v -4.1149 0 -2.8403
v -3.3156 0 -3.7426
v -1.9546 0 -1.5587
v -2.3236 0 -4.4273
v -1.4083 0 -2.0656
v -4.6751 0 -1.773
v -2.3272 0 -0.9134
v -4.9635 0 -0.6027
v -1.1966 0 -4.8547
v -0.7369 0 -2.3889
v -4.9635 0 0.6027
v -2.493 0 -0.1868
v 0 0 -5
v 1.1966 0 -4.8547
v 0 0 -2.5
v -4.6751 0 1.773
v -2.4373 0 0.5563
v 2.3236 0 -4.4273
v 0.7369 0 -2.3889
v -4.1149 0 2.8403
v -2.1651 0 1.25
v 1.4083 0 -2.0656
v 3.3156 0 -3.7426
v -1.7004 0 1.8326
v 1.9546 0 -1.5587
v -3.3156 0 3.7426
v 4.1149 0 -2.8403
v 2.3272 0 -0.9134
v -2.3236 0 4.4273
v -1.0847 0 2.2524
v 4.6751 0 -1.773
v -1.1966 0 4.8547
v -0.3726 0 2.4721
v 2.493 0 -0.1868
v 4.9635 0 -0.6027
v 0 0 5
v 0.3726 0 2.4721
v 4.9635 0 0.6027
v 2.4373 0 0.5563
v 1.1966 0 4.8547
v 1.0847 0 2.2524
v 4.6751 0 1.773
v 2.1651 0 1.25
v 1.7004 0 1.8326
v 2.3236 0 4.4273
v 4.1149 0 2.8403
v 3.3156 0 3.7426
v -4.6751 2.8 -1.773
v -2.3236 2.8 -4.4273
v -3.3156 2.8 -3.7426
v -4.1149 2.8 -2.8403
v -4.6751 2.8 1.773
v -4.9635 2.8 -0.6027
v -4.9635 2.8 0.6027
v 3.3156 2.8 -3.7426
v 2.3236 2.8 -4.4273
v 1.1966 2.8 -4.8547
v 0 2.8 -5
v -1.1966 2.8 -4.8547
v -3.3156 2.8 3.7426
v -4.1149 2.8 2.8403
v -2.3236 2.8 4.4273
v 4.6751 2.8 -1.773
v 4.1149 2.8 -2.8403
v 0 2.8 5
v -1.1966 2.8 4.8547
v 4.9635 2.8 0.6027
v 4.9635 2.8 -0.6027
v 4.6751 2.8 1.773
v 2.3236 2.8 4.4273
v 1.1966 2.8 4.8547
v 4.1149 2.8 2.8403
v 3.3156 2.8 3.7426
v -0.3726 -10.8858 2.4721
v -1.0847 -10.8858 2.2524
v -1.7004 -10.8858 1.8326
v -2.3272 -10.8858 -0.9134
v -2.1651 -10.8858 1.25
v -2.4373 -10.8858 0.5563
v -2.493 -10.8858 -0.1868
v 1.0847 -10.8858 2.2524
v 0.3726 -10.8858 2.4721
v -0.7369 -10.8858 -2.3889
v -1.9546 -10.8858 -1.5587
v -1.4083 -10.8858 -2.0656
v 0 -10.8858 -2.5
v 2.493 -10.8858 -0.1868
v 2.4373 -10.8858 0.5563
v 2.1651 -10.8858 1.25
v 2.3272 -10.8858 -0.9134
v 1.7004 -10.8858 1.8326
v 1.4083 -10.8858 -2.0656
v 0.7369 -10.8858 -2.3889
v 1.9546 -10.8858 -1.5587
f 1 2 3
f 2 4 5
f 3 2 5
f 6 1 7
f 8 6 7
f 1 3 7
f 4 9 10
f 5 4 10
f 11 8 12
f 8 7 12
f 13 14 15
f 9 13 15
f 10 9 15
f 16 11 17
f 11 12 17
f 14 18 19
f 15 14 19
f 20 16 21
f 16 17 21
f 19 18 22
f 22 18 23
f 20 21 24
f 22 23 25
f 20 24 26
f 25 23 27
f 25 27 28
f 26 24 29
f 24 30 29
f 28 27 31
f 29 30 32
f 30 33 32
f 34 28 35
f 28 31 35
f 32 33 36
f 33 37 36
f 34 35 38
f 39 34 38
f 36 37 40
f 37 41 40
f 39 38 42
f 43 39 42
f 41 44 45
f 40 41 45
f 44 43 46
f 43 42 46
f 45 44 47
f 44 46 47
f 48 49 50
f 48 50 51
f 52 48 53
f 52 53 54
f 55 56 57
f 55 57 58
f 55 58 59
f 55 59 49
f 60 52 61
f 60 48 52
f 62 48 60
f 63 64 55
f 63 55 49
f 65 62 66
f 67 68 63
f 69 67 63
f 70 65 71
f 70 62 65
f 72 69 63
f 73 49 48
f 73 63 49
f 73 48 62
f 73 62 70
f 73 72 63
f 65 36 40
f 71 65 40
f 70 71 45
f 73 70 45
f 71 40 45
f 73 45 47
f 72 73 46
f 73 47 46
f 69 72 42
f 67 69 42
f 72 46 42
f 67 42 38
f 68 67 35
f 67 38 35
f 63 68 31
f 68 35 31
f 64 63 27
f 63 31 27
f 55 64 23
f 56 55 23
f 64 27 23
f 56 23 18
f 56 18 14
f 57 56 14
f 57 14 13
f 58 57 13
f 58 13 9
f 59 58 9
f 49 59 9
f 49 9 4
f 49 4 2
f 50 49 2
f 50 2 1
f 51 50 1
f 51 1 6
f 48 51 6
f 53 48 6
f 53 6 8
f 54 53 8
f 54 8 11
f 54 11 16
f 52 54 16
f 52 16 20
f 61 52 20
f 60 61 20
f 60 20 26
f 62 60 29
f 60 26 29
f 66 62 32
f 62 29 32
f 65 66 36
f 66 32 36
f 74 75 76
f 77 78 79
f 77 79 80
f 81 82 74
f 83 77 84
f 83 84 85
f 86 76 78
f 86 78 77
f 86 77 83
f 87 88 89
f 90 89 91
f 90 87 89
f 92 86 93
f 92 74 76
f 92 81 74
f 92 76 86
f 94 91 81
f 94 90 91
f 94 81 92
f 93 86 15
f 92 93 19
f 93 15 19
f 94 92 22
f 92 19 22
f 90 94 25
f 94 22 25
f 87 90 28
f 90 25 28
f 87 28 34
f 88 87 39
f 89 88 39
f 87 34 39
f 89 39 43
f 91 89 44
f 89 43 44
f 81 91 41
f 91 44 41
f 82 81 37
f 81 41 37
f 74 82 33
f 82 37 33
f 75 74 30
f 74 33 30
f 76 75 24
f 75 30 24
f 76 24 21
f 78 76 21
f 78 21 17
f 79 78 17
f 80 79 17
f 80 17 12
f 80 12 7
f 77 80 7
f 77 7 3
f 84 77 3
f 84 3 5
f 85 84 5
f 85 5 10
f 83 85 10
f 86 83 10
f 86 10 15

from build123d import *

# Parameters (mm, degrees)
SKETCH1_R                = 5
SKETCH1_R_2              = 2.5
BOSS_EXTRUDE2_DEPTH      = 3
BOSS_EXTRUDE3_DEPTH      = 10.885792211
BOSS_EXTRUDE3_DEPTH_BACK = 3
SKETCH5_R                = 2.5
CUT_EXTRUDE3_START       = -0.2
SKETCH6_R                = 5
CUT_EXTRUDE3_DEPTH       = 0.2


with BuildPart() as part:
    # Sketch1 → Boss-Extrude2 (new body)
    with BuildSketch(Plane(origin=(0, 0, 0), x_dir=(1, 0, 0), z_dir=(0, 1, 0))):
        with Locations(Location((0, 0, 0), (0, 0, 270))):
            Circle(SKETCH1_R)
        with Locations(Location((0, 0, 0), (0, 0, 270))):
            Circle(SKETCH1_R_2, mode=Mode.SUBTRACT)
    extrude(amount=BOSS_EXTRUDE2_DEPTH)

    # Sketch5 → Boss-Extrude3 (add, two sides: drawn at the far end of the back side and taken through both)
    with BuildSketch(Plane.XZ.offset(-BOSS_EXTRUDE3_DEPTH_BACK)):
        with Locations(Location((0, 0, 0), (0, 0, 270))):
            Circle(SKETCH5_R)
    extrude(amount=BOSS_EXTRUDE3_DEPTH + BOSS_EXTRUDE3_DEPTH_BACK)

    # Sketch6 → Cut-Extrude3 (cut)
    with BuildSketch(Plane(origin=(0, 3, 0), x_dir=(1, 0, 0), z_dir=(0, 1, 0)).offset(CUT_EXTRUDE3_START)):
        with Locations(Location((0, 0, 0), (0, 0, 270))):
            Circle(SKETCH6_R)
    extrude(amount=CUT_EXTRUDE3_DEPTH, mode=Mode.SUBTRACT)


solid = part.part
